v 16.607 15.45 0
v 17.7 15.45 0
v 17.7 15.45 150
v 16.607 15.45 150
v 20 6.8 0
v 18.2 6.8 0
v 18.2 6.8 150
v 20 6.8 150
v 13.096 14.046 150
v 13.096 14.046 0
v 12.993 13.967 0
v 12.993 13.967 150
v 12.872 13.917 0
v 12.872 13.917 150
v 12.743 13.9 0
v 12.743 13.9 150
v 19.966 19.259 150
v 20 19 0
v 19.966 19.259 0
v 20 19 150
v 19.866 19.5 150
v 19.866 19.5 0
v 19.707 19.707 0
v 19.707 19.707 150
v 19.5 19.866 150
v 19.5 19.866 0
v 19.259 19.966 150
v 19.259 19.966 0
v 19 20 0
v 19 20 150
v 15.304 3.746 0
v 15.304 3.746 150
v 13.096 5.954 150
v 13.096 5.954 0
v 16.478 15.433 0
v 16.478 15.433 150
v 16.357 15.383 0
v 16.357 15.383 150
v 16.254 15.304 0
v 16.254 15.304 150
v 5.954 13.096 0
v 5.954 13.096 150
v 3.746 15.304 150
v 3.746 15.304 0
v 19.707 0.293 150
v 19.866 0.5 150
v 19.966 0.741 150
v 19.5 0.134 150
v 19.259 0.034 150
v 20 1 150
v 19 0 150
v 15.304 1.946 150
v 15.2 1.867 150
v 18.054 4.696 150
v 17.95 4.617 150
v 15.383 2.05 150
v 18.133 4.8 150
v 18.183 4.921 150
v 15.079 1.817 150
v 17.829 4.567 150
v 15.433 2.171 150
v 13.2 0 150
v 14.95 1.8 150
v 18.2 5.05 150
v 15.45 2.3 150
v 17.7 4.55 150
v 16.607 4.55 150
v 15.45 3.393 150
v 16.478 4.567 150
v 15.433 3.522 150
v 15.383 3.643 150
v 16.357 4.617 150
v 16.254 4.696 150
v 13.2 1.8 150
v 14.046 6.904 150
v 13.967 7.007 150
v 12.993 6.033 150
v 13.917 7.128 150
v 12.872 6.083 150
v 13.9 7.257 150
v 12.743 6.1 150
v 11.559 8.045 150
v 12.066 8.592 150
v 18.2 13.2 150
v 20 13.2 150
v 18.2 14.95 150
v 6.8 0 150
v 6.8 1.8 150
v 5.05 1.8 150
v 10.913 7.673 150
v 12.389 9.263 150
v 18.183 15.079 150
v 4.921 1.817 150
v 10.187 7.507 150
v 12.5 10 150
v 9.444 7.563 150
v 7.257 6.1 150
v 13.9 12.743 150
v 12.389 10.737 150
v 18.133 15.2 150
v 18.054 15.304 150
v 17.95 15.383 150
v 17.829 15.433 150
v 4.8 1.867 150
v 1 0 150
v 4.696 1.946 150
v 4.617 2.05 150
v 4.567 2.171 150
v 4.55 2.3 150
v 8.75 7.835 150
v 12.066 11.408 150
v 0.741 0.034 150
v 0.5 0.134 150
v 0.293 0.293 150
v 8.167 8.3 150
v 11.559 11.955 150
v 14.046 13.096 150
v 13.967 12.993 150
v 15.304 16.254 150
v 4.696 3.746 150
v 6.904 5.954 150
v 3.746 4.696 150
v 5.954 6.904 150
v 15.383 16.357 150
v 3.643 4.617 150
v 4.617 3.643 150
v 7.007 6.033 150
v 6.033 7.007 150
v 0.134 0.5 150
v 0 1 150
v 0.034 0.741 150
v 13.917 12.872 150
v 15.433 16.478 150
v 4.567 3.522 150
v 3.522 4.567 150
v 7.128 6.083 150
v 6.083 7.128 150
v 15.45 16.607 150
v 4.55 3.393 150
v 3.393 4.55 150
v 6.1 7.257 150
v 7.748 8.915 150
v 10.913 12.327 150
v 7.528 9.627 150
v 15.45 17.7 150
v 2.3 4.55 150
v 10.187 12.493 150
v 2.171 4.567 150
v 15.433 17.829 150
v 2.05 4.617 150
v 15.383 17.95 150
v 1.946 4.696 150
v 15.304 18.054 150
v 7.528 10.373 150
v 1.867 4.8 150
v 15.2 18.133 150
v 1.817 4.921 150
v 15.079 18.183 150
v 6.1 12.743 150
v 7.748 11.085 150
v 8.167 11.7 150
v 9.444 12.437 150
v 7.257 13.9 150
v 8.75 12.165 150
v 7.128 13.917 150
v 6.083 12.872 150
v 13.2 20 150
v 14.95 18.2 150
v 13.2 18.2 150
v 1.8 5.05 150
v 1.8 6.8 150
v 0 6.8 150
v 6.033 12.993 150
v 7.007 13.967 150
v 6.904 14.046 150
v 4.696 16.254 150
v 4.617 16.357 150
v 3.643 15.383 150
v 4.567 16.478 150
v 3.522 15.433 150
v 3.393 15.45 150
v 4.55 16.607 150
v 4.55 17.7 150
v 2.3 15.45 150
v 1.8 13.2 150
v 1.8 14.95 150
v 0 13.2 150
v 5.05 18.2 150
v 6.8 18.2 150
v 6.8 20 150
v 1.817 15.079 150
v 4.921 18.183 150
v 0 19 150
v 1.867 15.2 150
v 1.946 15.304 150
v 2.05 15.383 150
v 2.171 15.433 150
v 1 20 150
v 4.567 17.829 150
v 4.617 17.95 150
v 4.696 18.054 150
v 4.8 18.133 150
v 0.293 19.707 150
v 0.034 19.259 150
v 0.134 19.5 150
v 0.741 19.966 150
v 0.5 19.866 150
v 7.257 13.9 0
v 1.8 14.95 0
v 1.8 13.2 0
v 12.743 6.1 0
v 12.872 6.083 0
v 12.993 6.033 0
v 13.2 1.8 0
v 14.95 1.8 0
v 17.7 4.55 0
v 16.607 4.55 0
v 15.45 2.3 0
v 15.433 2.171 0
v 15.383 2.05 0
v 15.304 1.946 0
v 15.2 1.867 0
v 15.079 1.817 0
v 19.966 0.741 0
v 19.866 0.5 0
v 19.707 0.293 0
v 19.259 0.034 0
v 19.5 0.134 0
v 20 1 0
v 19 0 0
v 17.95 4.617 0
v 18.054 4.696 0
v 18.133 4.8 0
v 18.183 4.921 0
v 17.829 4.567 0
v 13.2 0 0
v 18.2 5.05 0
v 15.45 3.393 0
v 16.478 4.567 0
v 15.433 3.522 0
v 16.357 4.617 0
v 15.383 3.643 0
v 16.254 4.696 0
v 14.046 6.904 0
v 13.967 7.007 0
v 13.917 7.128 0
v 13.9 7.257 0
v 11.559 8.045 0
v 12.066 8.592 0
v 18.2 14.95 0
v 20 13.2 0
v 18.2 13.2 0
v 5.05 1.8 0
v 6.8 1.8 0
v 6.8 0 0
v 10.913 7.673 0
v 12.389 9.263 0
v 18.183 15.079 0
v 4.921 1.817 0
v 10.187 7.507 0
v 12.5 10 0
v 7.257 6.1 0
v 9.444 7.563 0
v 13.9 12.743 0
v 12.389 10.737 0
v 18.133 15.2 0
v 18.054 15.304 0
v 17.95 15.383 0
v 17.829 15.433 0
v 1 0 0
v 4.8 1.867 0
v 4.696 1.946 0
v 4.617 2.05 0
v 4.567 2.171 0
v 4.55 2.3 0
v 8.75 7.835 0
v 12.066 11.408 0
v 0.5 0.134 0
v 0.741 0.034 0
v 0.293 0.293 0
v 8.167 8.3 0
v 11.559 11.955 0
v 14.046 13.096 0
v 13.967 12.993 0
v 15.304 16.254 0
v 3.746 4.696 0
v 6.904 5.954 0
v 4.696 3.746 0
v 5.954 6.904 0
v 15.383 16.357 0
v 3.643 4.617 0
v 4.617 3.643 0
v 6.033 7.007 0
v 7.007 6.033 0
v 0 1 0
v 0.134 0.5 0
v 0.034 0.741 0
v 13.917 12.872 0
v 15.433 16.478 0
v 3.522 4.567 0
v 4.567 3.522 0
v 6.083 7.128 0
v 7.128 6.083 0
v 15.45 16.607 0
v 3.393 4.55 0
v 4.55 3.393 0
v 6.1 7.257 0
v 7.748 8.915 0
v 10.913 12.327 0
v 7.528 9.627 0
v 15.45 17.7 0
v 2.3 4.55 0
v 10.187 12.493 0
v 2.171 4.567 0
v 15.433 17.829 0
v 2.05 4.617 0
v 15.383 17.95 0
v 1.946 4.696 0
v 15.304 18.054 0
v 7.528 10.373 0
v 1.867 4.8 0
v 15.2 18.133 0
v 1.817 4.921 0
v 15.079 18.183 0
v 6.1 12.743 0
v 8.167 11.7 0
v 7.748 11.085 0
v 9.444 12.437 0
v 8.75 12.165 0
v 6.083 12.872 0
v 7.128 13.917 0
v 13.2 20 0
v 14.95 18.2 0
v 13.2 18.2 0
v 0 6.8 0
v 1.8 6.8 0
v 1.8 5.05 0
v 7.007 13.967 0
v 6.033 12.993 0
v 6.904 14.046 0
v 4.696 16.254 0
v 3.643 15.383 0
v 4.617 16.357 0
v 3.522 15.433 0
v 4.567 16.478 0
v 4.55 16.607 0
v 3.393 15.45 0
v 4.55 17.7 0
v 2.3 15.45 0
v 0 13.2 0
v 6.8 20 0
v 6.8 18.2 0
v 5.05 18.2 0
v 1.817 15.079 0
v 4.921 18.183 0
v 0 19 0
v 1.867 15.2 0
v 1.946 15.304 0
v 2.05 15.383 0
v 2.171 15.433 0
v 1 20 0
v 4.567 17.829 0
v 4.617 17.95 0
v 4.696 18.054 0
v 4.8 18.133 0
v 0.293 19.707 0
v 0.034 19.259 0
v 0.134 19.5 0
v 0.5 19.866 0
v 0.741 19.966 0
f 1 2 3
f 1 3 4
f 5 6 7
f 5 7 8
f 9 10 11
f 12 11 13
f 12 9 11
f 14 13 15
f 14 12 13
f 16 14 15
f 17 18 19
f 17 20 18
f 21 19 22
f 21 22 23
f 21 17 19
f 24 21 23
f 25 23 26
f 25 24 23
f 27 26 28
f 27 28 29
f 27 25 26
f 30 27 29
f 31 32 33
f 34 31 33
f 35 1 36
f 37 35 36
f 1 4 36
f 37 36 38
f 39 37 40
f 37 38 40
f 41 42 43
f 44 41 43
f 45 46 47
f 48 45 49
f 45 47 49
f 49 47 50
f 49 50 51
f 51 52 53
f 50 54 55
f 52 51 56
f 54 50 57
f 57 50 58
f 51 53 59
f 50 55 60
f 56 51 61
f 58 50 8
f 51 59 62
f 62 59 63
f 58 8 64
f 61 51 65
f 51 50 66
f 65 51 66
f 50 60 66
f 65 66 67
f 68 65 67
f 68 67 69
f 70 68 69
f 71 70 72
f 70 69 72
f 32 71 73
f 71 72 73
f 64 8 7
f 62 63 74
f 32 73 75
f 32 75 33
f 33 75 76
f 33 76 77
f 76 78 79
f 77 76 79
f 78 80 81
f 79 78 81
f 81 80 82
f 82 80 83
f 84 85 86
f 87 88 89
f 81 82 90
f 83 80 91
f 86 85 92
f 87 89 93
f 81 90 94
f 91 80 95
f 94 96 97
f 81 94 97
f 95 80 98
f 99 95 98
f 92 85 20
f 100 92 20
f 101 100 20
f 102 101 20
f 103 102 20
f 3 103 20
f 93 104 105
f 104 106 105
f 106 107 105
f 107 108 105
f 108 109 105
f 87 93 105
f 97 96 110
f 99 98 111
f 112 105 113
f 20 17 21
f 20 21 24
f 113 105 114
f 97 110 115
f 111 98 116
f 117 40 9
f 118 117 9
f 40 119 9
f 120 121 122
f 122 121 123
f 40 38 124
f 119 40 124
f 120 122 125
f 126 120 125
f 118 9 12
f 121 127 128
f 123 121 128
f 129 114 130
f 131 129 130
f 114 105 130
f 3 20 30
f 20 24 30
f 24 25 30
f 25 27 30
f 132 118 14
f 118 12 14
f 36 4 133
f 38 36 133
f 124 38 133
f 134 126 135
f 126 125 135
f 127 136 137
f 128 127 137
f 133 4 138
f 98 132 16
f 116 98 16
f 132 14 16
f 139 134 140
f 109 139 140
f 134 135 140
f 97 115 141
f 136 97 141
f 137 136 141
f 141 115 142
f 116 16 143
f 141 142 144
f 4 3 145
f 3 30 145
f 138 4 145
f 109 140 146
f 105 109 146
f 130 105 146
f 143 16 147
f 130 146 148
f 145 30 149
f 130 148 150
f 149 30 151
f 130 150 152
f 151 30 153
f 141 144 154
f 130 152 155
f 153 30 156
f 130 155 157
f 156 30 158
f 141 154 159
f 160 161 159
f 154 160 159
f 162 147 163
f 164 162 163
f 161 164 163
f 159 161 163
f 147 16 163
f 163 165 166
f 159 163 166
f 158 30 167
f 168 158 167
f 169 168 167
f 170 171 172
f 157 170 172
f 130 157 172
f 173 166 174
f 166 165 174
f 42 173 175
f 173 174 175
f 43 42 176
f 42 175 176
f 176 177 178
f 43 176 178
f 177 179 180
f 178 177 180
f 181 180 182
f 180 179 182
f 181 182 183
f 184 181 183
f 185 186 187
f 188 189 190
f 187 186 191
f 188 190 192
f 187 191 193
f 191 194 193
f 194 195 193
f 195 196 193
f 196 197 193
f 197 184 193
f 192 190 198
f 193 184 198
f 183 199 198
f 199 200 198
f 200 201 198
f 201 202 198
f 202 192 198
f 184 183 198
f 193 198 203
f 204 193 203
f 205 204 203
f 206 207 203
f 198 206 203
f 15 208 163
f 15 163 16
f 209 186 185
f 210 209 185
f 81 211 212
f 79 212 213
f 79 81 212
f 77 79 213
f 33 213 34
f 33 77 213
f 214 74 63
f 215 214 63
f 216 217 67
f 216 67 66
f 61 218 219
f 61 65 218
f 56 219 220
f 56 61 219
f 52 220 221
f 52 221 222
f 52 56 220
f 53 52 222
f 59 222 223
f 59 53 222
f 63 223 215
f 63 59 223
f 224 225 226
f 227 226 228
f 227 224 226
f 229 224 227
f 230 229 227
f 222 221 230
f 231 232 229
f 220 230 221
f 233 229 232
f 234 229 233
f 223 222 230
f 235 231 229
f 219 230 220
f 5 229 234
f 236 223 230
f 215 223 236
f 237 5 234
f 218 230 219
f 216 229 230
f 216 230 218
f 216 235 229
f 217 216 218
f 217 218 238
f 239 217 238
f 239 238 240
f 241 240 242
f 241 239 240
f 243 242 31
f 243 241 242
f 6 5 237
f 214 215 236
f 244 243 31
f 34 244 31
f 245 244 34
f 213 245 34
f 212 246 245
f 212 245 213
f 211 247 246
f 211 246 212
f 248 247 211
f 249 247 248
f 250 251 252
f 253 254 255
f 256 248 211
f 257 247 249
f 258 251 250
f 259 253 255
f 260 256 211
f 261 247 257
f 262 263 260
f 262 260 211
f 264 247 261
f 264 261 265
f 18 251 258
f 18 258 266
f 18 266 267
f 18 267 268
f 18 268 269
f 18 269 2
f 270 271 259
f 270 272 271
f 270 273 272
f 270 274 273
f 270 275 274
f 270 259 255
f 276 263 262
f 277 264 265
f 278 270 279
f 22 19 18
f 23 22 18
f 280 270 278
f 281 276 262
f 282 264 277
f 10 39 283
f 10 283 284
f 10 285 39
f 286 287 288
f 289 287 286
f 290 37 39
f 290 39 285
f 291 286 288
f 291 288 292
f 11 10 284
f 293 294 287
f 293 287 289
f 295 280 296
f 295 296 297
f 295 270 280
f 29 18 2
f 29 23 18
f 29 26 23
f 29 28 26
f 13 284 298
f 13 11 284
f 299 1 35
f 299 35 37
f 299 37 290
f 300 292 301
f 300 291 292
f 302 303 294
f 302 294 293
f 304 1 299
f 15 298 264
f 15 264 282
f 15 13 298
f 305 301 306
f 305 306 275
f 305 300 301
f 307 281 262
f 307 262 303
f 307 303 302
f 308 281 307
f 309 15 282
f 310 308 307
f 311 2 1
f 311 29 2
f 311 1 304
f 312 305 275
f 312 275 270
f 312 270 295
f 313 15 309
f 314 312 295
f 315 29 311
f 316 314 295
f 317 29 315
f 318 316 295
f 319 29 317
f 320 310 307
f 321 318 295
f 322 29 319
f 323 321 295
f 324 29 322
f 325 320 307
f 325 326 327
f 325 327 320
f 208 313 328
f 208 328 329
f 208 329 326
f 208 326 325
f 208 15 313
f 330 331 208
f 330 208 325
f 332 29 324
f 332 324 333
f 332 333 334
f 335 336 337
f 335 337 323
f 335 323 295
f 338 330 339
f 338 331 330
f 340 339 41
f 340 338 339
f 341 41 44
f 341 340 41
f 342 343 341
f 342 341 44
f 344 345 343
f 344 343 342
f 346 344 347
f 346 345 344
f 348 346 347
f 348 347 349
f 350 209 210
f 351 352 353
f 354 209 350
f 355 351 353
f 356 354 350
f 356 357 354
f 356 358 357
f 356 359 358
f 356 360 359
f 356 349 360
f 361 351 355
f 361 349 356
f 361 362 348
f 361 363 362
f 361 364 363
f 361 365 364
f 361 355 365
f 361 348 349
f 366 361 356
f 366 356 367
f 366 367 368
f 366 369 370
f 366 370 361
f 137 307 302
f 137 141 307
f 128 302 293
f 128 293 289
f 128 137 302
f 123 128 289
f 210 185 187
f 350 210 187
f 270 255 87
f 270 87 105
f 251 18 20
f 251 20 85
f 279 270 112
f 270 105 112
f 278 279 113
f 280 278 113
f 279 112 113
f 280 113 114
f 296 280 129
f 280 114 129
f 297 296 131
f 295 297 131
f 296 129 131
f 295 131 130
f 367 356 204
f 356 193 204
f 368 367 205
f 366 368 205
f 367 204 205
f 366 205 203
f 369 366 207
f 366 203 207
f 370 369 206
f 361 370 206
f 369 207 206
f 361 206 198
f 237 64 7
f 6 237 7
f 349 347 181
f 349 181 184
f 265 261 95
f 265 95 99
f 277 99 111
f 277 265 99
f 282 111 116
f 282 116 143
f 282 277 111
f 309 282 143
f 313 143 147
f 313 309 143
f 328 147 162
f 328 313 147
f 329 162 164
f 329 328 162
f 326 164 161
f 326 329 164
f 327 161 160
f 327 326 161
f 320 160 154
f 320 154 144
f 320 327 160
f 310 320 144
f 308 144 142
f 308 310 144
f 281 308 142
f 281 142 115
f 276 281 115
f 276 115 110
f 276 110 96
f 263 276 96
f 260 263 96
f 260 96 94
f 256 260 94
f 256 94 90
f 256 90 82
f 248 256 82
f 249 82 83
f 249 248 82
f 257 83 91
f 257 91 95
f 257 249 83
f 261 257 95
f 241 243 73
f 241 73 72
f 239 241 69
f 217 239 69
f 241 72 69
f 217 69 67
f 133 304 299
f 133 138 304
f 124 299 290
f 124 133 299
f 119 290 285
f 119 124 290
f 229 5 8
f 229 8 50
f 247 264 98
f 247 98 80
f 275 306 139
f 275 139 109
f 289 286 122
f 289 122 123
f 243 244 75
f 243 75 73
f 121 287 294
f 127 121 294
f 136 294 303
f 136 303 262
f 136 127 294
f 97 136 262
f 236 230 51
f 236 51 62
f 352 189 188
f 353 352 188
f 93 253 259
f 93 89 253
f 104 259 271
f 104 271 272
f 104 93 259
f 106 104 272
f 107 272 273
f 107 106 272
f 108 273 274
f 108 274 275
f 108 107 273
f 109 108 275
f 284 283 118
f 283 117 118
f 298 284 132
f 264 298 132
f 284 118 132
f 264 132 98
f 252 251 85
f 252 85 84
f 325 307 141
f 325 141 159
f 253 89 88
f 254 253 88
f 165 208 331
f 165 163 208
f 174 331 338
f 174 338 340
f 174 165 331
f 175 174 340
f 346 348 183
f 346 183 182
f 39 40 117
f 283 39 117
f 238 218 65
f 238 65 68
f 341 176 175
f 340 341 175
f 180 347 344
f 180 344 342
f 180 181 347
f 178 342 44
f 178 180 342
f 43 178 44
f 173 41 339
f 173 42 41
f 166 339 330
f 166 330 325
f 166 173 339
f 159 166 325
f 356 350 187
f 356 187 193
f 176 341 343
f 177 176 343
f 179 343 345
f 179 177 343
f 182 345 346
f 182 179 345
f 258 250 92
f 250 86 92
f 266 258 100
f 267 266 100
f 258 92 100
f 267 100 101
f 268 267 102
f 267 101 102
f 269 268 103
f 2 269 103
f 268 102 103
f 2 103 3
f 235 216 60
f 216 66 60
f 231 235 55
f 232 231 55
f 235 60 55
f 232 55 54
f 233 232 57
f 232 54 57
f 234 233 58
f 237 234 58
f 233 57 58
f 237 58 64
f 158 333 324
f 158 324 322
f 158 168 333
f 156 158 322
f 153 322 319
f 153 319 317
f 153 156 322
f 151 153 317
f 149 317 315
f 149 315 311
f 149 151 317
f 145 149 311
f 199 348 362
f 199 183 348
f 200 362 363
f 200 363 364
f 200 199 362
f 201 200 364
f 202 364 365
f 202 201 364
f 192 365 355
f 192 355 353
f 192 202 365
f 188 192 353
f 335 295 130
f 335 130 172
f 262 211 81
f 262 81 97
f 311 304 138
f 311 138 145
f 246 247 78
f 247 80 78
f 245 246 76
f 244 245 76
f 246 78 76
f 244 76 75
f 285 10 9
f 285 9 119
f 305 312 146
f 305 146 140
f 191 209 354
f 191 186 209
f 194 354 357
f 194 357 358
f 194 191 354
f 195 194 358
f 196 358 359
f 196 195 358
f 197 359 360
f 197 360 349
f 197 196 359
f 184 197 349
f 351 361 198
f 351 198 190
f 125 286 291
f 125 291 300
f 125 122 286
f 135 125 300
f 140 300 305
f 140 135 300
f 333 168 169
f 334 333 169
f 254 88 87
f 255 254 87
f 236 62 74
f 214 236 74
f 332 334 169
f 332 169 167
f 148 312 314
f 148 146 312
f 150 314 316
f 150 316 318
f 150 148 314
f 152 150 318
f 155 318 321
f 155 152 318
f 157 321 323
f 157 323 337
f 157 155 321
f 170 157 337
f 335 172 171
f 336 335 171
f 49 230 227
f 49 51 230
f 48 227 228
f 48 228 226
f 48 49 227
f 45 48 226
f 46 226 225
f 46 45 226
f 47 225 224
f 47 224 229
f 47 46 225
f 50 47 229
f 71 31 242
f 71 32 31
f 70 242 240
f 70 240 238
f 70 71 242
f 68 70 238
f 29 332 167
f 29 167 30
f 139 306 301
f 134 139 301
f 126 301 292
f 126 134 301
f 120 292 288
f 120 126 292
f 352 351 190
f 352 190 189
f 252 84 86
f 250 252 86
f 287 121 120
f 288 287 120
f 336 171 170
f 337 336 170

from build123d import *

# Parameters (mm, degrees)
SKETCH1_R           = 2.5
BOSS_EXTRUDE1_DEPTH = 150
FILLET1_R           = 1
FILLET2_R           = 0.5
FILLET3_R           = 0.5
FILLET4_R           = 0.5
FILLET5_R           = 0.5


with BuildPart() as part:
    # Sketch1 → Boss-Extrude1 (new body)
    with BuildSketch(Plane.XY):
        Polygon((13.2, 0), (13.2, 1.8), (15.45, 1.8), (15.45, 3.6), (12.95, 6.1), (7.05, 6.1), (4.55, 3.6), (4.55, 1.8), (6.8, 1.8), (6.8, 0), (0, 0), (0, 6.8), (1.8, 6.8), (1.8, 4.55), (3.6, 4.55), (6.1, 7.05), (6.1, 12.95), (3.6, 15.45), (1.8, 15.45), (1.8, 13.2), (0, 13.2), (0, 20), (6.8, 20), (6.8, 18.2), (4.55, 18.2), (4.55, 16.4), (7.05, 13.9), (12.95, 13.9), (15.45, 16.4), (15.45, 18.2), (13.2, 18.2), (13.2, 20), (20, 20), (20, 13.2), (18.2, 13.2), (18.2, 15.45), (16.4, 15.45), (13.9, 12.95), (13.9, 7.05), (16.4, 4.55), (18.2, 4.55), (18.2, 6.8), (20, 6.8), (20, 0), align=None)
        with Locations((10, 10)):
            Circle(SKETCH1_R, mode=Mode.SUBTRACT)
    extrude(amount=BOSS_EXTRUDE1_DEPTH)

    # Fillet1
    fillet1_edges = [part.edges().sort_by_distance(p)[0] for p in [
        (0, 0, 75),
        (0, 20, 75),
        (20, 20, 75),
        (20, 0, 75),
    ]]
    fillet(fillet1_edges, radius=FILLET1_R)

    # Fillet2
    fillet2_edges = [part.edges().sort_by_distance(p)[0] for p in [
        (4.55, 18.2, 75),
        (4.55, 16.4, 75),
        (7.05, 13.9, 75),
        (12.95, 13.9, 75),
        (15.45, 16.4, 75),
        (15.45, 18.2, 75),
    ]]
    fillet(fillet2_edges, radius=FILLET2_R)

    # Fillet3
    fillet3_edges = [part.edges().sort_by_distance(p)[0] for p in [
        (18.2, 15.45, 75),
        (16.4, 15.45, 75),
        (13.9, 12.95, 75),
        (13.9, 7.05, 75),
        (16.4, 4.55, 75),
        (18.2, 4.55, 75),
    ]]
    fillet(fillet3_edges, radius=FILLET3_R)

    # Fillet4
    fillet4_edges = [part.edges().sort_by_distance(p)[0] for p in [
        (1.8, 4.55, 75),
        (3.6, 4.55, 75),
        (6.1, 7.05, 75),
        (6.1, 12.95, 75),
        (3.6, 15.45, 75),
        (1.8, 15.45, 75),
    ]]
    fillet(fillet4_edges, radius=FILLET4_R)

    # Fillet5
    fillet5_edges = [part.edges().sort_by_distance(p)[0] for p in [
        (15.45, 1.8, 75),
        (15.45, 3.6, 75),
        (12.95, 6.1, 75),
        (7.05, 6.1, 75),
        (4.55, 3.6, 75),
        (4.55, 1.8, 75),
    ]]
    fillet(fillet5_edges, radius=FILLET5_R)


solid = part.part
